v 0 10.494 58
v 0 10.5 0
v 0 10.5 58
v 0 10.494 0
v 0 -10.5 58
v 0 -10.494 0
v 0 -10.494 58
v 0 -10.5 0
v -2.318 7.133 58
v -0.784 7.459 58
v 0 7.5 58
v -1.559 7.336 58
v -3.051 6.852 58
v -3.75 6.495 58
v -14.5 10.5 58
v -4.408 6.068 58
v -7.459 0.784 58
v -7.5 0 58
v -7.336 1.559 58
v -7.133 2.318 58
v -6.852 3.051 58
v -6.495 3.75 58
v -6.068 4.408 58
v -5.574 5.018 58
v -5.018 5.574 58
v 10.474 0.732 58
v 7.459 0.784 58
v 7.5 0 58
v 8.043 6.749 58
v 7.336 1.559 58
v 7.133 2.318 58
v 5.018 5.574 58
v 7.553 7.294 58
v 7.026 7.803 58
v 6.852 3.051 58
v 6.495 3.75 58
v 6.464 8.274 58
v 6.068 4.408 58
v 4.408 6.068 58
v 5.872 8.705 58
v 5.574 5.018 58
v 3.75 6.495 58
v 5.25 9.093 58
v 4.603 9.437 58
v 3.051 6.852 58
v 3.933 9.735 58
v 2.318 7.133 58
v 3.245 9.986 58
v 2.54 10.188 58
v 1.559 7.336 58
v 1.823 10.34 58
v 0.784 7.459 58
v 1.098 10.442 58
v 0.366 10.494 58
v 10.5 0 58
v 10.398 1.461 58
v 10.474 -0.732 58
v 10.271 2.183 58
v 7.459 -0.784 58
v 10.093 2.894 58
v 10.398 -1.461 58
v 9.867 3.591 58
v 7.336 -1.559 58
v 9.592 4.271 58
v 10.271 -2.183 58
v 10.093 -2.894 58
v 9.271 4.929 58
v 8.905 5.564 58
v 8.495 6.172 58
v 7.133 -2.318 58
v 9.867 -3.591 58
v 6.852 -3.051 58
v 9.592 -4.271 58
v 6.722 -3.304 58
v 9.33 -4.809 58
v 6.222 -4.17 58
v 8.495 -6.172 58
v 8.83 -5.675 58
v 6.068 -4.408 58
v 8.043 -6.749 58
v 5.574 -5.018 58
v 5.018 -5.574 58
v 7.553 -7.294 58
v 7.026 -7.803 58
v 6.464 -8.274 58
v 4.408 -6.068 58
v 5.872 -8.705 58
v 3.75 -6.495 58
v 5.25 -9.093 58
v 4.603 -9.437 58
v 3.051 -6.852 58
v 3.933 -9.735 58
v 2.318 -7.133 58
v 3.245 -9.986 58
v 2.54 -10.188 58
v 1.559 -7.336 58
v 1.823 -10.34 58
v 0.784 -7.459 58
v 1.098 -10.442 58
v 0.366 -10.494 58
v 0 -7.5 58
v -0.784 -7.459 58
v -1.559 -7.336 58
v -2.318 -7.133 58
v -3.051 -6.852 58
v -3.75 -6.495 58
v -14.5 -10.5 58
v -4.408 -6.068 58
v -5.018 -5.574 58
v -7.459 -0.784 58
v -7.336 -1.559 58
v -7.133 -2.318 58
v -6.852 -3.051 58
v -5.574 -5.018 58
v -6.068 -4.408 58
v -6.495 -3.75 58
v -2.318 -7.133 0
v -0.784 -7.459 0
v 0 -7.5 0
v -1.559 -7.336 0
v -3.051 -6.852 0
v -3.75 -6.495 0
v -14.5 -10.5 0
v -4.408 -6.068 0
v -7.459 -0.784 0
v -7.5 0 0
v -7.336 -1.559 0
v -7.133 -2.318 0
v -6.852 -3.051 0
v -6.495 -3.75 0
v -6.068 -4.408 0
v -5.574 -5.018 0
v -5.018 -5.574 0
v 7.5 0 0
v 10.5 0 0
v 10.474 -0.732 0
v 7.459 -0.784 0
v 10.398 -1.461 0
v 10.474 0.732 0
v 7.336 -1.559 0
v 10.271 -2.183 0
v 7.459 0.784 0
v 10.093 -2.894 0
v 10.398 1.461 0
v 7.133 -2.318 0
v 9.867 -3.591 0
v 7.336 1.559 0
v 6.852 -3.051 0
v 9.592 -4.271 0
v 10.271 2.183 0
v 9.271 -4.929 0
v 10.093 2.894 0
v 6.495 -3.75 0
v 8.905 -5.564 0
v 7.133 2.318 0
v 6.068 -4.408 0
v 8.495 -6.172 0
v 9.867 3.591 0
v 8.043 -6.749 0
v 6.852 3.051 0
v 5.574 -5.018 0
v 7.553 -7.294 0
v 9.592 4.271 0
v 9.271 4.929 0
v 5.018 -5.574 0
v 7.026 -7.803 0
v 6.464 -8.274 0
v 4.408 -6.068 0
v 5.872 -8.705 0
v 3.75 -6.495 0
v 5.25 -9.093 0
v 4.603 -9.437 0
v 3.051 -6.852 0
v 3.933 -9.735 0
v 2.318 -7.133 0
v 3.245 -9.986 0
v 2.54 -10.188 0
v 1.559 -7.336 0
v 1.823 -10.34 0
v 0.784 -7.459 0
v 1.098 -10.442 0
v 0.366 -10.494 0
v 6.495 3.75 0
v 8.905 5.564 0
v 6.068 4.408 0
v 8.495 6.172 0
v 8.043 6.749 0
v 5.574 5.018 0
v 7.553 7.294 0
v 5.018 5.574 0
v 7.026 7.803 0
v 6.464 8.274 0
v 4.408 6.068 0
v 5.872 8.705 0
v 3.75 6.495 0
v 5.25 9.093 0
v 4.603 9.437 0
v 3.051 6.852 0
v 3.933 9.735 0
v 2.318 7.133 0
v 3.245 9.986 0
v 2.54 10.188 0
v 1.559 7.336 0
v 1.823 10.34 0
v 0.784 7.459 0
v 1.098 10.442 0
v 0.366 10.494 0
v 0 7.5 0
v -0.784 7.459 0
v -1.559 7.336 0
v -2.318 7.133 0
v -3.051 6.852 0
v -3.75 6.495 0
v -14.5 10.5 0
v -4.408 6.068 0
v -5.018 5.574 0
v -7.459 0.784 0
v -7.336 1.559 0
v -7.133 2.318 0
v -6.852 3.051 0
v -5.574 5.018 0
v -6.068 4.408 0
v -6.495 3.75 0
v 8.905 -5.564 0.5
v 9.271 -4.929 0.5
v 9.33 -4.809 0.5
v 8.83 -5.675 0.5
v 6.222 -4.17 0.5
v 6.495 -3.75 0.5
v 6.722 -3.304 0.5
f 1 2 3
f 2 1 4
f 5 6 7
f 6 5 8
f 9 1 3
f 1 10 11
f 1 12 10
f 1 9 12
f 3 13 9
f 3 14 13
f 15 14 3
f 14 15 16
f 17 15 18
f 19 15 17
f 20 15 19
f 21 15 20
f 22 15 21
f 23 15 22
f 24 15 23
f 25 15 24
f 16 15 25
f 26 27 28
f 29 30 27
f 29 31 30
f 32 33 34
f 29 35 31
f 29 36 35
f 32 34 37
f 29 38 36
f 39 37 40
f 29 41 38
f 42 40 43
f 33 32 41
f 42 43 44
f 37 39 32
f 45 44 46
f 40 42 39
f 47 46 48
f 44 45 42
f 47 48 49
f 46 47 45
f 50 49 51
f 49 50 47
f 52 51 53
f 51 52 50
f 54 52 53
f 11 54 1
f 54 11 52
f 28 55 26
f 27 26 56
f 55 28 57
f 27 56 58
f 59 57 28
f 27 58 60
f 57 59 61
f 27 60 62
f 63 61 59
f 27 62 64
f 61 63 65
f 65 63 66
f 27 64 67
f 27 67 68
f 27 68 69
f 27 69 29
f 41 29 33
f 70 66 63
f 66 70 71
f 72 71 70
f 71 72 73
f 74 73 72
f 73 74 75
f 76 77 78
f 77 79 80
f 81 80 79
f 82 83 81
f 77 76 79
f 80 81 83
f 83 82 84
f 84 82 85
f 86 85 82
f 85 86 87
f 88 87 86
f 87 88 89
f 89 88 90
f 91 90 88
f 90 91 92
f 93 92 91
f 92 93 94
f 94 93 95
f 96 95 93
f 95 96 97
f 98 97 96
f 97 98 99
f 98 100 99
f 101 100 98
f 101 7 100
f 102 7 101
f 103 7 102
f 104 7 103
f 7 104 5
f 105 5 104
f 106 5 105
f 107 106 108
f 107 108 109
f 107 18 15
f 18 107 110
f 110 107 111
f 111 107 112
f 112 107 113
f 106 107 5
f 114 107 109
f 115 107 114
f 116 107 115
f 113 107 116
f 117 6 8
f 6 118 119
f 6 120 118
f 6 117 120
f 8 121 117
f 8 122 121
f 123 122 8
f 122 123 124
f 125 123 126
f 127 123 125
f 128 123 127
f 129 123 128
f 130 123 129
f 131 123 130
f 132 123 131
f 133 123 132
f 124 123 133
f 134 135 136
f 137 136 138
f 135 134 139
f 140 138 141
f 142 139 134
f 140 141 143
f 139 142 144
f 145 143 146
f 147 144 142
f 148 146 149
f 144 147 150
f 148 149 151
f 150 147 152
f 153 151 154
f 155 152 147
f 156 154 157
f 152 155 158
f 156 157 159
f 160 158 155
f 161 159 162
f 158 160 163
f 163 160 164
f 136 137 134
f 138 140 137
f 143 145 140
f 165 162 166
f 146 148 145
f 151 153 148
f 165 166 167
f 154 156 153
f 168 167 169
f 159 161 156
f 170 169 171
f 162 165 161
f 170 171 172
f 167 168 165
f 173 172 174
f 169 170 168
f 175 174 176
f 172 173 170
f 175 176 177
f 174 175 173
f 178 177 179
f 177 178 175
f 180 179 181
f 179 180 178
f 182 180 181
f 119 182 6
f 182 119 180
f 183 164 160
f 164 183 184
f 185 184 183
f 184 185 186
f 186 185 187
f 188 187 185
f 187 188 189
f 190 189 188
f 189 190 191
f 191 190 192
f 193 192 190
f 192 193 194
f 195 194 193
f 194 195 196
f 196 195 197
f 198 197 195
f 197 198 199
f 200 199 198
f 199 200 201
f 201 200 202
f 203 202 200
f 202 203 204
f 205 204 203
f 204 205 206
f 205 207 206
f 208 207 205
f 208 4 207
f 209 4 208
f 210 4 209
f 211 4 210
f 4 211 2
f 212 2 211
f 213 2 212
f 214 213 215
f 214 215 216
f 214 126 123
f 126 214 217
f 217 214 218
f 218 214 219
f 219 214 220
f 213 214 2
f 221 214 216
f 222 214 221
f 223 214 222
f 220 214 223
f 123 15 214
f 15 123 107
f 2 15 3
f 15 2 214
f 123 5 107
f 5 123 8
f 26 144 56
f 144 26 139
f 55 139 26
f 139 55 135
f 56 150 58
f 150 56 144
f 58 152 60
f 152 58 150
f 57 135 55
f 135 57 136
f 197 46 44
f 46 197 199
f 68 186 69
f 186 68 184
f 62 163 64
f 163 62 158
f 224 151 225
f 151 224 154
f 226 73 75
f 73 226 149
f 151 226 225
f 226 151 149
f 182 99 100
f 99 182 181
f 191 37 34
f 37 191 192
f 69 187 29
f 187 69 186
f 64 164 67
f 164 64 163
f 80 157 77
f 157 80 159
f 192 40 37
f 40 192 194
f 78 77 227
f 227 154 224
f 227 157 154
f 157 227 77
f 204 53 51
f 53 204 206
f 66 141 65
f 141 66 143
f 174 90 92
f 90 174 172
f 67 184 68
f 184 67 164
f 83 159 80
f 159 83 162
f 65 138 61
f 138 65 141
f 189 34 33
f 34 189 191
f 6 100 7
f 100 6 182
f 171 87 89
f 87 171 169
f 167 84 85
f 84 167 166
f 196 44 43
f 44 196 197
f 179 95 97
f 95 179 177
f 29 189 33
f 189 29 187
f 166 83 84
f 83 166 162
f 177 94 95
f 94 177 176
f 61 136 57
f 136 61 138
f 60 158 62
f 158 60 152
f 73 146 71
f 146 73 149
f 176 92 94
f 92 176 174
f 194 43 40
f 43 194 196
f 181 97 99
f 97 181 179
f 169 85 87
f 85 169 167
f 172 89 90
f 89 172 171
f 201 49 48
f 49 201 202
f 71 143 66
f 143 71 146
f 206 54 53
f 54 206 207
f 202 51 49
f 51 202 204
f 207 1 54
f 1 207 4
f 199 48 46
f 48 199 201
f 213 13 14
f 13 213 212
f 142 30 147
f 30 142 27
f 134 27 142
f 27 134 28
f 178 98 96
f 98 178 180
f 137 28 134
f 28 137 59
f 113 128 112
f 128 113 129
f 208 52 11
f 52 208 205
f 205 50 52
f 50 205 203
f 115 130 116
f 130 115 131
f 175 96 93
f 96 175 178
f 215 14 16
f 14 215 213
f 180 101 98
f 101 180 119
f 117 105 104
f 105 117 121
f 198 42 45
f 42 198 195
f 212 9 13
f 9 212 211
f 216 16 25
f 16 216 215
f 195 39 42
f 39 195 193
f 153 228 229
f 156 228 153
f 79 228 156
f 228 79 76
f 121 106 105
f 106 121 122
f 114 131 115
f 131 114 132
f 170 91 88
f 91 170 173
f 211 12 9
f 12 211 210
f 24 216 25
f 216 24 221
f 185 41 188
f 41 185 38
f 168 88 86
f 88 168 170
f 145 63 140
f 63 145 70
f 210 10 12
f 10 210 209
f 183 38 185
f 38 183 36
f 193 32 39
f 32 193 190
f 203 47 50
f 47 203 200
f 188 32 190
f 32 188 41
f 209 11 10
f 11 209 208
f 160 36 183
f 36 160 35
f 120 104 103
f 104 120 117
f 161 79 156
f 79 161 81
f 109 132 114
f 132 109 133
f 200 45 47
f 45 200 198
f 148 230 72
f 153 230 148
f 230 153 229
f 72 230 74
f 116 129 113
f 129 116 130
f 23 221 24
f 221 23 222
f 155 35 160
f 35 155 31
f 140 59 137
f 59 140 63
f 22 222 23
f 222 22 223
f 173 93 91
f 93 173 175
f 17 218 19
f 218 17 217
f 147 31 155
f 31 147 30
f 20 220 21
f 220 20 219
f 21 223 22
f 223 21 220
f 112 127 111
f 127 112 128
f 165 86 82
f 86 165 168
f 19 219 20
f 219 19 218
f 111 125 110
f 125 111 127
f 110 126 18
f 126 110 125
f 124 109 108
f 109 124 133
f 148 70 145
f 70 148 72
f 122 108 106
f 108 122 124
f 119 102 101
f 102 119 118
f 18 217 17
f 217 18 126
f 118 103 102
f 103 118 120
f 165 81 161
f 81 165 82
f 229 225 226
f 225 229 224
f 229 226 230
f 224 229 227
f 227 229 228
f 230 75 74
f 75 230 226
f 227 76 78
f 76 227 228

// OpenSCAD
// PRUSA iteration3
// Bearing holders
// GNU GPL v3
// Josef Průša <iam@josefprusa.cz> and contributors
// http://www.reprap.org/wiki/Prusa_Mendel
// http://prusamendel.org

bearing_diameter = 15;

module horizontal_bearing_base(bearings=1){
 translate(v=[0,0,6]) cube(size = [24,8+bearings*25,12], center = true);
}
module horizontal_bearing_holes(bearings=1, ziptie = 2){
 cutter_lenght = 10+bearings*25;
 one_holder_lenght = 8+25;
 holder_lenght = 8+bearings*25;

 // Main bearing cut
 difference(){
  translate(v=[0,0,12+1.5]) rotate(a=[90,0,0]) translate(v=[0,0,-cutter_lenght/2]) cylinder(h = cutter_lenght, r=bearing_diameter/2, $fn=50);
  // Bearing retainers
  translate(v=[0,1-holder_lenght/2,3+1.5]) cube(size = [24,6,8], center = true);
  translate(v=[0,-1+holder_lenght/2,3+1.5]) cube(size = [24,6,8], center = true);
 }

 // Ziptie cutouts
 if (ziptie > 0) {
 ziptie_cut_ofset = 1;
 for ( i = [0 : bearings-1] ){
  // For easier positioning I move them by half of one
  // bearing holder then add each bearign lenght and then center again
  translate(v=[0,-holder_lenght/2,0]) translate(v=[0,one_holder_lenght/2+i*25,0]) difference(){
      union(){
            for (z = [1:ziptie]){
                translate(v=[0,(25/(ziptie+1))*(z)+z-25/2,12]) rotate(a=[90,0,0]) cylinder(h = 4, r=12.5, $fn=50);
            }
    //translate(v=[0,2-6,12]) rotate(a=[90,0,0]) translate(v=[0,0,0]) cylinder(h = 4, r=12.5, $fn=50);
    //translate(v=[0,2+6,12]) rotate(a=[90,0,0]) translate(v=[0,0,0]) cylinder(h = 4, r=12.5, $fn=50);
    }
   translate(v=[0,10,12]) rotate(a=[90,0,0]) translate(v=[0,0,0]) cylinder(h = 24, r=10, $fn=50);
  }
}
 }

}

module horizontal_bearing_test(){
 difference(){
  horizontal_bearing_base(1);
  horizontal_bearing_holes(1);
 }
 translate(v=[30,0,0]) difference(){
  horizontal_bearing_base(2);
  horizontal_bearing_holes(2);
 }
 translate(v=[60,0,0]) difference(){
  horizontal_bearing_base(3);
  horizontal_bearing_holes(3);
 }
}



thinwall = 3;
bearing_size = bearing_diameter + 2 * thinwall;

module vertical_bearing_base(){
 translate(v=[-2-bearing_size/4,0,29]) cube(size = [4+bearing_size/2,bearing_size,58], center = true);
 cylinder(h = 58, r=bearing_size/2, $fn = 90);
}

module vertical_bearing_holes(){
  translate(v=[0,0,-1]) cylinder(h = 62, r=bearing_diameter/2, $fn = 60);
  rotate(a=[0,0,-30]) translate(v=[8,0,31.5]) cube(size = [5,1,62], center = true);
}

difference(){
vertical_bearing_base();
vertical_bearing_holes();
}
